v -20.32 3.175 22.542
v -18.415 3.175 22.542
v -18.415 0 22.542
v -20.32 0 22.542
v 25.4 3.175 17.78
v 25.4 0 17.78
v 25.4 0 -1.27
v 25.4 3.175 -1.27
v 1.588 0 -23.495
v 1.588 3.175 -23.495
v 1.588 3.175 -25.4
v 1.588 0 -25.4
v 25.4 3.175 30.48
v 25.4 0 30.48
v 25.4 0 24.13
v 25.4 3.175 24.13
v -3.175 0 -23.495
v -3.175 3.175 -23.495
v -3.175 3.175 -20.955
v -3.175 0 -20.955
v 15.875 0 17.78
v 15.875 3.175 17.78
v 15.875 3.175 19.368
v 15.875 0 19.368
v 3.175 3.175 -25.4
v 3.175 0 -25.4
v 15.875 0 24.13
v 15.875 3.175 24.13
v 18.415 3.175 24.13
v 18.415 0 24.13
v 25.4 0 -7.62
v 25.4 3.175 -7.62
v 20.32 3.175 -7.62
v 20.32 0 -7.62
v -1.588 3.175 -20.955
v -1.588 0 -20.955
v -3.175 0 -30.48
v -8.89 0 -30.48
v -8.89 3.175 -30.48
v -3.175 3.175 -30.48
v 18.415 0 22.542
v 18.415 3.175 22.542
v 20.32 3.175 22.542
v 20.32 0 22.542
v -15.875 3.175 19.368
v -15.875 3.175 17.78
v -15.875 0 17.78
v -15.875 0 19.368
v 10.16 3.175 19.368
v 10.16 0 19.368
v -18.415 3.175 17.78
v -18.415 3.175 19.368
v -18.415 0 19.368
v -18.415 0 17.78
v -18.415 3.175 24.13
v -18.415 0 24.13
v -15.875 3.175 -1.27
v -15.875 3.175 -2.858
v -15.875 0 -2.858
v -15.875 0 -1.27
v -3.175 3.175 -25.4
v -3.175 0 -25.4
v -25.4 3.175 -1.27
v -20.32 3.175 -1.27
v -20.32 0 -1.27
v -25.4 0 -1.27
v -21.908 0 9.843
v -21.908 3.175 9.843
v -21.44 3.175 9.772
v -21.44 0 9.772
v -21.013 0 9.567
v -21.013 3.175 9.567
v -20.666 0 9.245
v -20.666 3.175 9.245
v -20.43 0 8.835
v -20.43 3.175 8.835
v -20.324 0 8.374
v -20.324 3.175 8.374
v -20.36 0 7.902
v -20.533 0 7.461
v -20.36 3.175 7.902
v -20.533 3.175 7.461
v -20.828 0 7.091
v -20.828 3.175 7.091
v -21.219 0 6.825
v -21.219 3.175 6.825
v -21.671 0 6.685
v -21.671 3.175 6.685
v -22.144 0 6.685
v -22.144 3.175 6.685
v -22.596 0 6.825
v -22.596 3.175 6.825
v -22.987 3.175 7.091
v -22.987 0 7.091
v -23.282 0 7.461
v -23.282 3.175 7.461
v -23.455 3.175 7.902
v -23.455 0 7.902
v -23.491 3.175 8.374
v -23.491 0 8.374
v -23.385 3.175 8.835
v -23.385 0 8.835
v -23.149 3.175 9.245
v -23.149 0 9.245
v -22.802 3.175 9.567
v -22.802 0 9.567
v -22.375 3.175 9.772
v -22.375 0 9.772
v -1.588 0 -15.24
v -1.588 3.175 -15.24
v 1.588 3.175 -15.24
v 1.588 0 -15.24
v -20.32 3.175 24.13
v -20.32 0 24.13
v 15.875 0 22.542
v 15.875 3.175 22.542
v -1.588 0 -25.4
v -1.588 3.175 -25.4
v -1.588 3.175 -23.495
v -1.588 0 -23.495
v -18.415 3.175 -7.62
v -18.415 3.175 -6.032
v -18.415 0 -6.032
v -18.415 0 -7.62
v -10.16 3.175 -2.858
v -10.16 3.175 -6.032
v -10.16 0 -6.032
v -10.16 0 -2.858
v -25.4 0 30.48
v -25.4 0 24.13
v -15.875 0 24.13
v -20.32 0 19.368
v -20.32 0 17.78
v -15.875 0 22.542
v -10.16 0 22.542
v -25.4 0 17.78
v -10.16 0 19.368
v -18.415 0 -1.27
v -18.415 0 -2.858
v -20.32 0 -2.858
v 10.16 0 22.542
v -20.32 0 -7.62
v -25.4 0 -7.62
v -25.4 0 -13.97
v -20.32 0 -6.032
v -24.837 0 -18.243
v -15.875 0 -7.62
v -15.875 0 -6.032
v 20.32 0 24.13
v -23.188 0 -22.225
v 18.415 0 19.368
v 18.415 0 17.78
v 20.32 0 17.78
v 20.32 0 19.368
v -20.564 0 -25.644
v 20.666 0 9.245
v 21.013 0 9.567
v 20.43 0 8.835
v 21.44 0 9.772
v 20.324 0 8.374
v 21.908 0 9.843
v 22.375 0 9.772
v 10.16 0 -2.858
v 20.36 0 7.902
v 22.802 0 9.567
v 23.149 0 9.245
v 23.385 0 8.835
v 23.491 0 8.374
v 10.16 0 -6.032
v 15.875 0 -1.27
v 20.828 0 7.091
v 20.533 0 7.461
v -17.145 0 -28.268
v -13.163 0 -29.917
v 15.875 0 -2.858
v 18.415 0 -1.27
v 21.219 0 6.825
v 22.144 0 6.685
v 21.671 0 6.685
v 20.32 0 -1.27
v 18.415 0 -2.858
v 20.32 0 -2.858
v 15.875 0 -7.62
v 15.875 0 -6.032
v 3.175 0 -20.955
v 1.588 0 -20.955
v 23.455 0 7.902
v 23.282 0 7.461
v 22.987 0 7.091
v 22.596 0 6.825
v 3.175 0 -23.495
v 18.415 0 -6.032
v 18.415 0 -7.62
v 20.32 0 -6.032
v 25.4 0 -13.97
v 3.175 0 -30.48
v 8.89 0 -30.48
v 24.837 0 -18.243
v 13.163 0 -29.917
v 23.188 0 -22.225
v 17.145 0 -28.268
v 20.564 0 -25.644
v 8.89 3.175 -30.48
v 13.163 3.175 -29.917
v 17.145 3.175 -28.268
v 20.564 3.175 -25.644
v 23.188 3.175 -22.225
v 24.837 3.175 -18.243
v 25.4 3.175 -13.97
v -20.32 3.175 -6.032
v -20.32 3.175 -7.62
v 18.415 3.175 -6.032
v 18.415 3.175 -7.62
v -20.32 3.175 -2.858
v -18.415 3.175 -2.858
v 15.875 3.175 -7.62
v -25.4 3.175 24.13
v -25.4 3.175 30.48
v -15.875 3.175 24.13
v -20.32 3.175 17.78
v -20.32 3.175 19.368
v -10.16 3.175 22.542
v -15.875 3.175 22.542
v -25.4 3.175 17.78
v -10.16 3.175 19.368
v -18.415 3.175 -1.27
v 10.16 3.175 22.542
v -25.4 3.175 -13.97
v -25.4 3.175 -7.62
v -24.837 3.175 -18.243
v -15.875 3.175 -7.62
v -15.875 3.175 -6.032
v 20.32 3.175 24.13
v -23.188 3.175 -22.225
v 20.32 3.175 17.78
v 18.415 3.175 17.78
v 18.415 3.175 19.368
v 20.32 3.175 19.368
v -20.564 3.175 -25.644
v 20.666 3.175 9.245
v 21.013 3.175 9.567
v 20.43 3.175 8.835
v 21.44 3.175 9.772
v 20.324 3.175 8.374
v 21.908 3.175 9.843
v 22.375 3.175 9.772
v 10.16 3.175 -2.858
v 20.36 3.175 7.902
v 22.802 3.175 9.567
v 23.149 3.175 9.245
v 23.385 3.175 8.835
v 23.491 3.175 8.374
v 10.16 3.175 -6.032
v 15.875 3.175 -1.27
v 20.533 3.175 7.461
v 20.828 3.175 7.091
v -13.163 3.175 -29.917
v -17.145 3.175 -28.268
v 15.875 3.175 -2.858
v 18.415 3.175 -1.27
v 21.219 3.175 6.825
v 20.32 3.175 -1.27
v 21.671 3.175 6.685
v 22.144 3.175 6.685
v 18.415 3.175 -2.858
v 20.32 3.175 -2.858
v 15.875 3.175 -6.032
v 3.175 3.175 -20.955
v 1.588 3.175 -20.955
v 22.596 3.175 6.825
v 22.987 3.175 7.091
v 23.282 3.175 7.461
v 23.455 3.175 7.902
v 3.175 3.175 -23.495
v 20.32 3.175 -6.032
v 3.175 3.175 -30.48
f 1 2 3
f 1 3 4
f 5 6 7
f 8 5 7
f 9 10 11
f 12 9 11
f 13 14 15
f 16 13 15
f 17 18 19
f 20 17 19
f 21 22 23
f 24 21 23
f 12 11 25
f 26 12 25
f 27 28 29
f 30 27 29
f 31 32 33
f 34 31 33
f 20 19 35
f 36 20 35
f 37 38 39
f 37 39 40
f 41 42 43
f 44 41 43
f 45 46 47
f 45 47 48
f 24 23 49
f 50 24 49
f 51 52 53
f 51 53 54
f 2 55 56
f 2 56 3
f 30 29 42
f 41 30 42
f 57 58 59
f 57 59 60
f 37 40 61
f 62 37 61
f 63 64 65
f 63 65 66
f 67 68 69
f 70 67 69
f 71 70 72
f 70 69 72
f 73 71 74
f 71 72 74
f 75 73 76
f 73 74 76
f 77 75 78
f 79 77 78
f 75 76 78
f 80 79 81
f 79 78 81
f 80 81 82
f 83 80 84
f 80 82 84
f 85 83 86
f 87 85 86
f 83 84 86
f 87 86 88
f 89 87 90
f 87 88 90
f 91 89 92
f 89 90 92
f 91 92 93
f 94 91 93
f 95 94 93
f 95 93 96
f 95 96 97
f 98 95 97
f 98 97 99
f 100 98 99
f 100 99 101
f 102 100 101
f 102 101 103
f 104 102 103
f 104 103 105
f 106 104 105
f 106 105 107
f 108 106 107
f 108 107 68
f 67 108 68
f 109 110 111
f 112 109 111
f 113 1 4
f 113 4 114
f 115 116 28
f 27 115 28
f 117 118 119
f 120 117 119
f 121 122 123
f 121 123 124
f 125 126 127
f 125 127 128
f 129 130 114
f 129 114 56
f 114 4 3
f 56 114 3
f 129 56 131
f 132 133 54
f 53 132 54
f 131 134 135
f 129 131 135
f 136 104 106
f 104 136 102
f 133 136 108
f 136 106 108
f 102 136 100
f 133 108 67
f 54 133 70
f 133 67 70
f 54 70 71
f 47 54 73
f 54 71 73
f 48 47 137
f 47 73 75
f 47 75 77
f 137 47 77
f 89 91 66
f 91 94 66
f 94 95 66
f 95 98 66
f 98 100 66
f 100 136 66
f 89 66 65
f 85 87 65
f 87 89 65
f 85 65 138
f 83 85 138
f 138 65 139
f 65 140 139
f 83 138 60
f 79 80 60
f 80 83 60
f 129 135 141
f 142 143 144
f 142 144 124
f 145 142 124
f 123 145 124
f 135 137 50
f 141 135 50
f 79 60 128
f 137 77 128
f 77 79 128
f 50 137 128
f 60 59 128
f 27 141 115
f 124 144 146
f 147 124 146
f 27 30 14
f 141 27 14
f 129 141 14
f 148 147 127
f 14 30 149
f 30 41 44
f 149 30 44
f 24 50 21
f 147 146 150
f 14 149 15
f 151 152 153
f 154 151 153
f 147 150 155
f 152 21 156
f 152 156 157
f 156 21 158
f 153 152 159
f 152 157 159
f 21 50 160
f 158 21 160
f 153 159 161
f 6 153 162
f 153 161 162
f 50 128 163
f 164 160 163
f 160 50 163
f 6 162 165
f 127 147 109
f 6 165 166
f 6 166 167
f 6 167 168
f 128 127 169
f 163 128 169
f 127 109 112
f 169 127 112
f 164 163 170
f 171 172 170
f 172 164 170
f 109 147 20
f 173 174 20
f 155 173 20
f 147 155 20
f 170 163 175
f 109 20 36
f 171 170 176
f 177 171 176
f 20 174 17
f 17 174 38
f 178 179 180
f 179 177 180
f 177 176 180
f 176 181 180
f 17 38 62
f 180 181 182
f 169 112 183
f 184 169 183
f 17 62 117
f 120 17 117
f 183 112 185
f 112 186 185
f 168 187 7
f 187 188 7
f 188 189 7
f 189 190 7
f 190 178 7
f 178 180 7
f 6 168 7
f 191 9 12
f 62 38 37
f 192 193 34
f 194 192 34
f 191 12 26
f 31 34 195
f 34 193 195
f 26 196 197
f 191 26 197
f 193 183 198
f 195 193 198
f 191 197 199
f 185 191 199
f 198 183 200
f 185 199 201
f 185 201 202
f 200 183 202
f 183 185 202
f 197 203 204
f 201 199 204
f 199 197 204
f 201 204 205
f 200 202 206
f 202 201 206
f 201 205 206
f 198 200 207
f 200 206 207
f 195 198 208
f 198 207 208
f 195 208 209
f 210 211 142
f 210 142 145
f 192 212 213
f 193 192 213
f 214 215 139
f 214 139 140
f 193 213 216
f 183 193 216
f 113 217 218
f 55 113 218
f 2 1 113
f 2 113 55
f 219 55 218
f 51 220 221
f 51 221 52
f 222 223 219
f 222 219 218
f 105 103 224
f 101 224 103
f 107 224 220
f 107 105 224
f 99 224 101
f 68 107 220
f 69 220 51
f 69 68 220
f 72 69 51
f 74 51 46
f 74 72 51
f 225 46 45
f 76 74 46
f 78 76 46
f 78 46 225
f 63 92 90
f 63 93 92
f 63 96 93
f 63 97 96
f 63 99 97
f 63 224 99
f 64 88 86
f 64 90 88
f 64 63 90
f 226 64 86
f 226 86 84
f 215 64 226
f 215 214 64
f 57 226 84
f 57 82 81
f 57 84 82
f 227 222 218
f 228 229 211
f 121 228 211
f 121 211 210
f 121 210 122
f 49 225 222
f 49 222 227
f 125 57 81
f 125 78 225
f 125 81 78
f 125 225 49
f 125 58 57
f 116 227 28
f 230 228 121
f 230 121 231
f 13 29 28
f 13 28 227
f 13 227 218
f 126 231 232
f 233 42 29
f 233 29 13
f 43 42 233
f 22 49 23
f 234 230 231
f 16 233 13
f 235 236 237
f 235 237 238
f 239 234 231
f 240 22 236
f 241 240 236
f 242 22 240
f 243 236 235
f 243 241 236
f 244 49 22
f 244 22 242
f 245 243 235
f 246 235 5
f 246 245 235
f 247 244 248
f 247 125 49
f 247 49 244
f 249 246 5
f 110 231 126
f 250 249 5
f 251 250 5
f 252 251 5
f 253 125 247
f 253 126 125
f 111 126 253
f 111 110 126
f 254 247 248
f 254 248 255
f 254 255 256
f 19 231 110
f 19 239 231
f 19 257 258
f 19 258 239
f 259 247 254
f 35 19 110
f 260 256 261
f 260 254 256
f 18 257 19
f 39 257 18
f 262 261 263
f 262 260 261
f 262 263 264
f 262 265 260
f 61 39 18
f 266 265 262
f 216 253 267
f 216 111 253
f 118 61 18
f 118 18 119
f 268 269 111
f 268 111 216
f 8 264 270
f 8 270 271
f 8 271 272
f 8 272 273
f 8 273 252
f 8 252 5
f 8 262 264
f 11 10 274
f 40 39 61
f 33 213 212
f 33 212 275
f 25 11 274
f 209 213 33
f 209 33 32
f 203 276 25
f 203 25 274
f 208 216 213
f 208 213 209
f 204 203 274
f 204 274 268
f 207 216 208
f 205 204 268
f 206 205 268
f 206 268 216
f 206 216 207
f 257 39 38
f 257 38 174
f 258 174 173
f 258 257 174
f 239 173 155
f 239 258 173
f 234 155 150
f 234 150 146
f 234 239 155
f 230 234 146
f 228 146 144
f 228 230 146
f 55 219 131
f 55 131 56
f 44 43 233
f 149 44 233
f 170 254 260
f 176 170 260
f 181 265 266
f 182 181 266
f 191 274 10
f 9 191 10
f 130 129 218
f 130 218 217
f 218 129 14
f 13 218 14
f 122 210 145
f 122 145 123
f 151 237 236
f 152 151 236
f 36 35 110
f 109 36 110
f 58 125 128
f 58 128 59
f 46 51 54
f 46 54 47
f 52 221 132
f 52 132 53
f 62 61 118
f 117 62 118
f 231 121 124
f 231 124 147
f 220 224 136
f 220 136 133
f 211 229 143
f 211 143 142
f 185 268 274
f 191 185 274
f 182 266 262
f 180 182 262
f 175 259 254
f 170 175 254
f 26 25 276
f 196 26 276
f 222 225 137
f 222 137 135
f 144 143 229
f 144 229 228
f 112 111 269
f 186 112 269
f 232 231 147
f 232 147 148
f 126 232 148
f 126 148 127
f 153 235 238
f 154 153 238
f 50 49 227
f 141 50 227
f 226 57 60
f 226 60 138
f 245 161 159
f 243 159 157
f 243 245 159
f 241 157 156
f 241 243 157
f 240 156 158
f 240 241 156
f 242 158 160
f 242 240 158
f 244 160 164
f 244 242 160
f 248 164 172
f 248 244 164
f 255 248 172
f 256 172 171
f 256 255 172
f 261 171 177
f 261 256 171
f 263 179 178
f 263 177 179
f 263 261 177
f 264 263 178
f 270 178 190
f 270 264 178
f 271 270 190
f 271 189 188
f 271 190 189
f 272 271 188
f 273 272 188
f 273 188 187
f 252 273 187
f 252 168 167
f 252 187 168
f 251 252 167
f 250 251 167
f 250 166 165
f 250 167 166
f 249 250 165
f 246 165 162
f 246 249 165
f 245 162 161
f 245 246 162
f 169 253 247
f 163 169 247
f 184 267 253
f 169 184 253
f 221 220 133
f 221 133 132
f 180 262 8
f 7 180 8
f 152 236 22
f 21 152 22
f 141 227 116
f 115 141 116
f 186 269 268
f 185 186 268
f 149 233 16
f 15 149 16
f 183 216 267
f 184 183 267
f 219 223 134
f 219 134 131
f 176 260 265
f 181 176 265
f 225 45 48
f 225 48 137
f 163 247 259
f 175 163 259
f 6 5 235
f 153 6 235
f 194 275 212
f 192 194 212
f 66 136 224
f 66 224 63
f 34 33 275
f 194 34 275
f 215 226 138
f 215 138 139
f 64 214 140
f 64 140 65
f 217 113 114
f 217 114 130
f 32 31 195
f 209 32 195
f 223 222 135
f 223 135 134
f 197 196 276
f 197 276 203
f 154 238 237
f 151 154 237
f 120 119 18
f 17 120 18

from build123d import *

# Parameters (mm, degrees)
SKETCH1_W            = 50.8
SKETCH1_H            = 60.96
BOSS_EXTRUDE2_DEPTH  = 3.175
CUT_EXTRUDE3_DEPTH   = 40.802902218
LPATTERN3_COUNT      = 2
LPATTERN3_PITCH      = 25.4
SKETCH6_R            = 1.5875
CUT_EXTRUDE4_DEPTH   = 40.802902218
MIRROR4_COPY_1_DEPTH = 40.802902218
CUT_EXTRUDE5_DEPTH   = 40.802902218
CUT_EXTRUDE6_DEPTH   = 40.802902218


with BuildPart() as part:
    # Sketch1 → Boss-Extrude2 (new body)
    with BuildSketch(Plane(origin=(0, 0, 0), x_dir=(1, 0, 0), z_dir=(0, 1, 0))):
        Rectangle(SKETCH1_W, SKETCH1_H)
    extrude(amount=BOSS_EXTRUDE2_DEPTH)

    # Sketch5 → Cut-Extrude3 (cut, through all)
    with BuildSketch(Plane(origin=(0, 3.175, 0), x_dir=(1, 0, 0), z_dir=(0, 1, 0))):
        Polygon((-20.32, 6.0325), (-18.415, 6.0325), (-18.415, 7.62), (-15.875, 7.62), (-15.875, 6.0325), (-10.16, 6.0325), (-10.16, 2.8575), (-15.875, 2.8575), (-15.875, 1.27), (-18.415, 1.27), (-18.415, 2.8575), (-20.32, 2.8575), (-20.32, 1.27), (-25.4, 1.27), (-25.4, 7.62), (-20.32, 7.62), align=None)
    cut_extrude3 = extrude(amount=-CUT_EXTRUDE3_DEPTH, mode=Mode.SUBTRACT)

    # LPattern3: Cut-Extrude3 ×2
    with Locations(*[(0, 0, i * LPATTERN3_PITCH) for i in range(1, LPATTERN3_COUNT)]):
        add(cut_extrude3, mode=Mode.SUBTRACT)

    # Sketch6 → Cut-Extrude4 (cut, through all)
    with BuildSketch(Plane(origin=(0, 3.175, 0), x_dir=(1, 0, 0), z_dir=(0, 1, 0))):
        with Locations(Location((-21.9075, -8.255, 0), (0, 0, 270))):
            Circle(SKETCH6_R)
    cut_extrude4 = extrude(amount=-CUT_EXTRUDE4_DEPTH, mode=Mode.SUBTRACT)

    # Mirror4: Cut-Extrude3, Cut-Extrude4 across plane
    add(cut_extrude3.mirror(Plane(origin=(0, 0, 0), x_dir=(0, 0, 1), z_dir=(1, 0, 0))), mode=Mode.SUBTRACT)
    add(cut_extrude4.mirror(Plane(origin=(0, 0, 0), x_dir=(0, 0, 1), z_dir=(1, 0, 0))), mode=Mode.SUBTRACT)

    # Mirror4 copy 1 sketch → Mirror4 copy 1 (cut, through all)
    with BuildSketch(Plane(origin=(0, 3.175, 25.4), x_dir=(-1, 0, 0), z_dir=(0, 1, 0))):
        Polygon((-20.32, -6.0325), (-18.415, -6.0325), (-18.415, -7.62), (-15.875, -7.62), (-15.875, -6.0325), (-10.16, -6.0325), (-10.16, -2.8575), (-15.875, -2.8575), (-15.875, -1.27), (-18.415, -1.27), (-18.415, -2.8575), (-20.32, -2.8575), (-20.32, -1.27), (-25.4, -1.27), (-25.4, -7.62), (-20.32, -7.62), align=None)
    extrude(amount=-MIRROR4_COPY_1_DEPTH, mode=Mode.SUBTRACT)

    # Sketch7 → Cut-Extrude5 (cut, through all)
    with BuildSketch(Plane(origin=(0, 3.175, 0), x_dir=(1, 0, 0), z_dir=(0, 1, 0))):
        Polygon((-3.175, 30.48), (-3.175, 25.4), (-1.5875, 25.4), (-1.5875, 23.495), (-3.175, 23.495), (-3.175, 20.955), (-1.5875, 20.955), (-1.5875, 15.24), (1.5875, 15.24), (1.5875, 20.955), (3.175, 20.955), (3.175, 23.495), (1.5875, 23.495), (1.5875, 25.4), (3.175, 25.4), (3.175, 30.48), align=None)
    extrude(amount=-CUT_EXTRUDE5_DEPTH, mode=Mode.SUBTRACT)

    # Sketch10 → Cut-Extrude6 (cut, through all)
    with BuildSketch(Plane(origin=(0, 3.175, 0), x_dir=(1, 0, 0), z_dir=(0, 1, 0))):
        with BuildLine():
            Line((-25.4, 13.97), (-25.4, 30.48))
            Line((-25.4, 30.48), (-8.89, 30.48))
            ThreePointArc((-8.89, 30.48), (-20.564332957, 25.644332957), (-25.4, 13.97))
        make_face()
        with BuildLine():
            Line((25.4, 13.97), (25.4, 30.48))
            Line((25.4, 30.48), (8.89, 30.48))
            ThreePointArc((8.89, 30.48), (20.564332957, 25.644332957), (25.4, 13.97))
        make_face()
    extrude(amount=-CUT_EXTRUDE6_DEPTH, mode=Mode.SUBTRACT)


solid = part.part
